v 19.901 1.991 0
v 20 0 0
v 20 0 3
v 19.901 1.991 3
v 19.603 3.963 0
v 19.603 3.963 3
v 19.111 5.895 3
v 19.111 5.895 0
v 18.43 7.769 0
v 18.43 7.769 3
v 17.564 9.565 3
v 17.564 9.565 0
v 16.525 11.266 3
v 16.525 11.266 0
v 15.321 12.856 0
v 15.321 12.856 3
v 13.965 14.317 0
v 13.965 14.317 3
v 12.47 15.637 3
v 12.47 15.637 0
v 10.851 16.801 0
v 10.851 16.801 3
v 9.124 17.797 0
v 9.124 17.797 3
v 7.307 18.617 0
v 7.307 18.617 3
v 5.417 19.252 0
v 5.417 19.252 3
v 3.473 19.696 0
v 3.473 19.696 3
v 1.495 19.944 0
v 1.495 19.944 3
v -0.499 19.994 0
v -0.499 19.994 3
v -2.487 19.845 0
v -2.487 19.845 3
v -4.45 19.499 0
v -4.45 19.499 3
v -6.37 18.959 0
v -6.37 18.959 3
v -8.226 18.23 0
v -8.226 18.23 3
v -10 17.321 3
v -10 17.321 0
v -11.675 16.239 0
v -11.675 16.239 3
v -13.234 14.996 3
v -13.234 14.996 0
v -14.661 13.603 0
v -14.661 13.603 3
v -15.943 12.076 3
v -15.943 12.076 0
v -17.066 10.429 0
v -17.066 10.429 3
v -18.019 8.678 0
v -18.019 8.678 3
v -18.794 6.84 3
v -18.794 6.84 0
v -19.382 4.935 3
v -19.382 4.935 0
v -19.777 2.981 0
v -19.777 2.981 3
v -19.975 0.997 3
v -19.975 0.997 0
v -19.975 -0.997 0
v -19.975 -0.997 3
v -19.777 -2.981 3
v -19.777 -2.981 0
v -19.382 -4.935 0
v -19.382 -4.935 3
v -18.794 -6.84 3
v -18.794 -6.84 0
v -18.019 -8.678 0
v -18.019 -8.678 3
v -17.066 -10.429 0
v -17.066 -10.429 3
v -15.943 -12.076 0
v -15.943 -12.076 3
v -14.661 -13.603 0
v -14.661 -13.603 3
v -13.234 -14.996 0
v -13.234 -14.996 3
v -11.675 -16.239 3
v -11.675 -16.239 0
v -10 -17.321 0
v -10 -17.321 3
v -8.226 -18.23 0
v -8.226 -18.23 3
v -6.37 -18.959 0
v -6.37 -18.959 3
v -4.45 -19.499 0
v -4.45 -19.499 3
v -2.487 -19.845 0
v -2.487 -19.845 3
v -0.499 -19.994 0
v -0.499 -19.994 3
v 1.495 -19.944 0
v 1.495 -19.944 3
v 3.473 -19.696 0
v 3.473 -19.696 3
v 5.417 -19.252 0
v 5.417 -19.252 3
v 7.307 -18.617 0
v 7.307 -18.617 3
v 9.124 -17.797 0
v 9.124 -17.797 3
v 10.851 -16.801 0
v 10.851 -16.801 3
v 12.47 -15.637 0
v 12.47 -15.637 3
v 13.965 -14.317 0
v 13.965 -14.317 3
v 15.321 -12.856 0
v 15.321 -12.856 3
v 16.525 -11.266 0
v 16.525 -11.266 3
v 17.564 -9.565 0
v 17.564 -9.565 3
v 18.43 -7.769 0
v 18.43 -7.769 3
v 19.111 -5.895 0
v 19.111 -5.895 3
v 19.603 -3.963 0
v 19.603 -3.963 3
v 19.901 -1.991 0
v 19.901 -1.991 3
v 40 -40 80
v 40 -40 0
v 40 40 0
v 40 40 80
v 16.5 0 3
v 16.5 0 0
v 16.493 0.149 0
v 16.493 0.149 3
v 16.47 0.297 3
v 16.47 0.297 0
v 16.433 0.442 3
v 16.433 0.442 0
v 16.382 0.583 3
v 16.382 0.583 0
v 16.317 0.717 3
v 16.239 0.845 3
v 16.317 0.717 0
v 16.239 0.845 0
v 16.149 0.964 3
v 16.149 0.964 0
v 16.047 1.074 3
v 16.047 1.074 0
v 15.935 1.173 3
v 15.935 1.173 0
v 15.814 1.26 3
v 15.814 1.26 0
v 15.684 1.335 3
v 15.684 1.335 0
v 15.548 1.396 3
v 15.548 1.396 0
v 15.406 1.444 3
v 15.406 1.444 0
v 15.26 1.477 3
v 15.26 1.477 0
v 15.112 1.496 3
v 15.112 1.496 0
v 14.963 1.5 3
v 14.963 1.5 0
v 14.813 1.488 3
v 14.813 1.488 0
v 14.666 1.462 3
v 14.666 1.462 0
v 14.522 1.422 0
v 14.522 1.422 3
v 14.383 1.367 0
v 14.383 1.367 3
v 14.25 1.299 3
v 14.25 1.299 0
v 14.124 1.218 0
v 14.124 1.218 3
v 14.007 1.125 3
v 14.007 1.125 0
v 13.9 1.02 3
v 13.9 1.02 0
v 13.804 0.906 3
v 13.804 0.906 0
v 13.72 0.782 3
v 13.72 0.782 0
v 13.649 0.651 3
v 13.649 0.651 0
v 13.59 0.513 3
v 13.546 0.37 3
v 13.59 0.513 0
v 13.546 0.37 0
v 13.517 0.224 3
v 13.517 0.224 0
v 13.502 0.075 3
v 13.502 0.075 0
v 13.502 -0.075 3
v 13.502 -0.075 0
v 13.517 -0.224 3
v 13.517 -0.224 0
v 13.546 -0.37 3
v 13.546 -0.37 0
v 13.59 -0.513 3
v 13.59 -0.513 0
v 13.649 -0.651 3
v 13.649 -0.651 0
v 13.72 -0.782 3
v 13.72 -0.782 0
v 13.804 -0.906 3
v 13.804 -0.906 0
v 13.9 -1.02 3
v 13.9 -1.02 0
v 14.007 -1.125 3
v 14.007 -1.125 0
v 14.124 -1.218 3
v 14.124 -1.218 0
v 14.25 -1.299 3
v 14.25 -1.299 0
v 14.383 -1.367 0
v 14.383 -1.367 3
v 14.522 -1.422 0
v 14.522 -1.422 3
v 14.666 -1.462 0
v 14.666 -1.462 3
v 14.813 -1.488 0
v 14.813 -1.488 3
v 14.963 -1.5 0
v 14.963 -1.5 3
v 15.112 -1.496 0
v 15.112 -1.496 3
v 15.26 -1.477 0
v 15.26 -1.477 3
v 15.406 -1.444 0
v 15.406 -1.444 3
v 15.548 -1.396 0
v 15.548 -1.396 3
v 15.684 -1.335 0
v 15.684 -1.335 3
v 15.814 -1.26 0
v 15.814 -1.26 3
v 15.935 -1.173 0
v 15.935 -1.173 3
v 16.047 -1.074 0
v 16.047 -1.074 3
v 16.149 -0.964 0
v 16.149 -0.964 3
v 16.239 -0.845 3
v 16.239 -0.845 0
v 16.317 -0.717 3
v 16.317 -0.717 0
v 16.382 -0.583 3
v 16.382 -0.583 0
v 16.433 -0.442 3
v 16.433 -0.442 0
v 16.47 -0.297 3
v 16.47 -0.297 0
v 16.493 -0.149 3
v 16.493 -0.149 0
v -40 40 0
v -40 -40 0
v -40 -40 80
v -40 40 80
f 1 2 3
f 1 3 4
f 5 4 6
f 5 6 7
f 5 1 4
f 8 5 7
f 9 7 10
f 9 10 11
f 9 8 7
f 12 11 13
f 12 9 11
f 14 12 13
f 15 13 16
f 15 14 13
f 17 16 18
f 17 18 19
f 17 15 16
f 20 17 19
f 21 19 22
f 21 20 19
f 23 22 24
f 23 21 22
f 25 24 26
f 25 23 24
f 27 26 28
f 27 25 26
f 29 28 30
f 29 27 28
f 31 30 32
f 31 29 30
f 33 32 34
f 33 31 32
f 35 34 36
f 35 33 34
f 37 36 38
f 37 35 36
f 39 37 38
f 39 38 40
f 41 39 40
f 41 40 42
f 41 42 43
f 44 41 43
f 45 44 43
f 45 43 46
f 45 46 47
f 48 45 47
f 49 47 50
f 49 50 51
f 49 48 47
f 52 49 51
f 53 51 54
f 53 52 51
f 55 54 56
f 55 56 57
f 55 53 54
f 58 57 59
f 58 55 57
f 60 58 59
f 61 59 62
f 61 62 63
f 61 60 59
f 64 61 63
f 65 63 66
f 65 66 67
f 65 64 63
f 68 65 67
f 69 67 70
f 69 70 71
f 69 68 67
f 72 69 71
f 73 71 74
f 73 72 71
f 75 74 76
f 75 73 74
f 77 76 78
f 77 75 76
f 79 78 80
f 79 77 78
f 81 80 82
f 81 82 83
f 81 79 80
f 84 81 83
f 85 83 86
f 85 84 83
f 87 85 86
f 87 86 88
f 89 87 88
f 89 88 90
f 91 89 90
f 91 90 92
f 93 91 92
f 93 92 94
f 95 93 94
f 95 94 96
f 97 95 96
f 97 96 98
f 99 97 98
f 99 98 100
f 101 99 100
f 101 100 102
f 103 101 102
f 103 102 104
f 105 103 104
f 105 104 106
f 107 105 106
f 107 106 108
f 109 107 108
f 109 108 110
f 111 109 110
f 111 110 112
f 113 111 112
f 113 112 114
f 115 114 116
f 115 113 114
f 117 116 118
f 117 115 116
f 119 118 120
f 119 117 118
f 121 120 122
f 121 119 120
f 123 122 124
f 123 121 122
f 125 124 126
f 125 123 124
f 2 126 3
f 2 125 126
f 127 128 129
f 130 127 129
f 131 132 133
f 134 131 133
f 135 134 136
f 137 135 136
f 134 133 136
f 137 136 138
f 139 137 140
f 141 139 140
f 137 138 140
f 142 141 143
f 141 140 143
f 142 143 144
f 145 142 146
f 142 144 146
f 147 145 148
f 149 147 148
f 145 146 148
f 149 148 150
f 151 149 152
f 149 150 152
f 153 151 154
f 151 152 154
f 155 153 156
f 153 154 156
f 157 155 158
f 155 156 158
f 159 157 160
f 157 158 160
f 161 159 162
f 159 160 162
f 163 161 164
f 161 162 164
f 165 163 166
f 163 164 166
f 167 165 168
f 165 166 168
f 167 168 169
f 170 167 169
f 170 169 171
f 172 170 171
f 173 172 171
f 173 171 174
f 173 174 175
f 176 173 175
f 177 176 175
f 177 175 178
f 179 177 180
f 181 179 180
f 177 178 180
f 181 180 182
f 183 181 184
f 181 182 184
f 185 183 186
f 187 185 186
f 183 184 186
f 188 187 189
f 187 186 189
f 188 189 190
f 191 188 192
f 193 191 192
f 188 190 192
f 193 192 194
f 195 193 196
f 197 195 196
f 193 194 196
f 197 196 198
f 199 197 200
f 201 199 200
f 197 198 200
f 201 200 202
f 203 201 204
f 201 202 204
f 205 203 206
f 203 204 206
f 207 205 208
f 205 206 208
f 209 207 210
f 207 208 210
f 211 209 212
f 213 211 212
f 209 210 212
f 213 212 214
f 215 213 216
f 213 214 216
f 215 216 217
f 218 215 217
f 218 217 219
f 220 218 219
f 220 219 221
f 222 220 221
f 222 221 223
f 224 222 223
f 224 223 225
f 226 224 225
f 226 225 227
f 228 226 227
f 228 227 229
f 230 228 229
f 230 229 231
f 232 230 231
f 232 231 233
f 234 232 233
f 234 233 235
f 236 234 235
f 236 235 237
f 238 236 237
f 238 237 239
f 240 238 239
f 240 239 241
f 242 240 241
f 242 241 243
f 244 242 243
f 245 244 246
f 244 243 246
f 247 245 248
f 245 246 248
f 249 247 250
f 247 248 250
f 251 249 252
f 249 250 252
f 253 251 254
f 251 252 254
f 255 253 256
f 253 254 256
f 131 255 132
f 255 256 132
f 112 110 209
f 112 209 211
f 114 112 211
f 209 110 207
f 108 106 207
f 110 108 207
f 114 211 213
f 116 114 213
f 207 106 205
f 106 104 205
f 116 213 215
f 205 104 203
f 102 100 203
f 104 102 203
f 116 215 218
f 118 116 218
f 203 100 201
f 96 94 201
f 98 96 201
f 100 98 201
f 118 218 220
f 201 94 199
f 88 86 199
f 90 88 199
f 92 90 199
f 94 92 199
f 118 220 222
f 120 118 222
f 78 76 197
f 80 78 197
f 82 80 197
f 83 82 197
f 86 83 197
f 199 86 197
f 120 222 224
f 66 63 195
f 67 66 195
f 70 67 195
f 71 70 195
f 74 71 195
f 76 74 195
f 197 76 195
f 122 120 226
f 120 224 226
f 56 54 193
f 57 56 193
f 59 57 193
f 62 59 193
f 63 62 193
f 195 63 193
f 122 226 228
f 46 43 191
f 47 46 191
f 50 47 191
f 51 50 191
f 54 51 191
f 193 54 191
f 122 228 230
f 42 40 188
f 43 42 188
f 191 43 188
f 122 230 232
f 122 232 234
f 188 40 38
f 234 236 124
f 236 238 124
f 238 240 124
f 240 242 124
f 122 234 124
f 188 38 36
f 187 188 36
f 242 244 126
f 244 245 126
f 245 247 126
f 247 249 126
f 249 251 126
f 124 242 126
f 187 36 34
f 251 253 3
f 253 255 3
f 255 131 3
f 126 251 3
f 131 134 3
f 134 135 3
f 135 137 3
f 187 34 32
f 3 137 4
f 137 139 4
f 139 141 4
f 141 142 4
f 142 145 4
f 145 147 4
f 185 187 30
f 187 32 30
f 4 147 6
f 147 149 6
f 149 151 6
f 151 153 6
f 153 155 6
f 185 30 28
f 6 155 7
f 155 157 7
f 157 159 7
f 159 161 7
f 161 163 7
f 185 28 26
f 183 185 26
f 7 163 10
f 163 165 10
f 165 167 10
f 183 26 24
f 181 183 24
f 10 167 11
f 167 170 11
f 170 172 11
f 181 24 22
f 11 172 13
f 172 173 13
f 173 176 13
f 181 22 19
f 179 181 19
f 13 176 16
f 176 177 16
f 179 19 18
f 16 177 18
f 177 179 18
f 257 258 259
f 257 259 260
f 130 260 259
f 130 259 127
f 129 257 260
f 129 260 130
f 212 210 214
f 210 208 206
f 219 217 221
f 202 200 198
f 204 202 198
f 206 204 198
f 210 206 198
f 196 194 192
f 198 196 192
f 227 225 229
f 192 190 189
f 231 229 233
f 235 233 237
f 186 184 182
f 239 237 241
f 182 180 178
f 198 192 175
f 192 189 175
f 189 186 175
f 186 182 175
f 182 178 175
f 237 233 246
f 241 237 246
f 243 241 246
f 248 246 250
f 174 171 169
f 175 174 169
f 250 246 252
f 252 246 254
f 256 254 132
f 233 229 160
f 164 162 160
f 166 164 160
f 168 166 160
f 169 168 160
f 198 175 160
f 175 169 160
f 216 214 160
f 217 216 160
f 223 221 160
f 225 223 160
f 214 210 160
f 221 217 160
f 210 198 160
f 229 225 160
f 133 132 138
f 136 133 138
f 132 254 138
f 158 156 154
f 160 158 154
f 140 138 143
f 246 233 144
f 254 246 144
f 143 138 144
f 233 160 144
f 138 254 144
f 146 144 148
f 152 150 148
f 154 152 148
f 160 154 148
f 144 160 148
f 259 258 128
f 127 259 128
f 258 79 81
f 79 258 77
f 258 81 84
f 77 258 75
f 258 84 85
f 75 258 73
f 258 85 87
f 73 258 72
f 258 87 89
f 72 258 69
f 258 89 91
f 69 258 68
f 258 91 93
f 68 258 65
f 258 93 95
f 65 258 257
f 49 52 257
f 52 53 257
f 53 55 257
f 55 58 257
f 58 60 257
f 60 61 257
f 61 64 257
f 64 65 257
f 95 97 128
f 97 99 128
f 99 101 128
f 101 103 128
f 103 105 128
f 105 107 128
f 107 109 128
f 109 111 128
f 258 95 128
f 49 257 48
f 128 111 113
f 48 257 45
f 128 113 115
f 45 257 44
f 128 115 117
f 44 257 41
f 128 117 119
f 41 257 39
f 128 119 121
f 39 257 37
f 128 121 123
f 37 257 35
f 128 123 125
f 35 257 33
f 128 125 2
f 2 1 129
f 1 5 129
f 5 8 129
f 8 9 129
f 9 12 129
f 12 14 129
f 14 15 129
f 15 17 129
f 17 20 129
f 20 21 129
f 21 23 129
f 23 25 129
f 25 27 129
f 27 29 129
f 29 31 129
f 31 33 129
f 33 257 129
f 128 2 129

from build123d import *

# Parameters (mm, degrees)
ESQUISSE1_W             = 80
ESQUISSE1_H             = 80
BOSS_EXTRU_1_DEPTH      = 80
ESQUISSE1_4_R           = 20
ESQUISSE1_4_R_2         = 1.5
ENL_V_MAT_EXTRU_1_DEPTH = 3


with BuildPart() as part:
    # Esquisse1 → Boss.-Extru.1 (new body)
    with BuildSketch(Plane.XY):
        Rectangle(ESQUISSE1_W, ESQUISSE1_H)
    extrude(amount=BOSS_EXTRU_1_DEPTH)

    # Esquisse1<4> → Enlèv. mat.-Extru.1 (cut)
    with BuildSketch(Plane.XY):
        Circle(ESQUISSE1_4_R)
        with Locations((15, 0)):
            Circle(ESQUISSE1_4_R_2, mode=Mode.SUBTRACT)
    extrude(amount=ENL_V_MAT_EXTRU_1_DEPTH, mode=Mode.SUBTRACT)


solid = part.part
